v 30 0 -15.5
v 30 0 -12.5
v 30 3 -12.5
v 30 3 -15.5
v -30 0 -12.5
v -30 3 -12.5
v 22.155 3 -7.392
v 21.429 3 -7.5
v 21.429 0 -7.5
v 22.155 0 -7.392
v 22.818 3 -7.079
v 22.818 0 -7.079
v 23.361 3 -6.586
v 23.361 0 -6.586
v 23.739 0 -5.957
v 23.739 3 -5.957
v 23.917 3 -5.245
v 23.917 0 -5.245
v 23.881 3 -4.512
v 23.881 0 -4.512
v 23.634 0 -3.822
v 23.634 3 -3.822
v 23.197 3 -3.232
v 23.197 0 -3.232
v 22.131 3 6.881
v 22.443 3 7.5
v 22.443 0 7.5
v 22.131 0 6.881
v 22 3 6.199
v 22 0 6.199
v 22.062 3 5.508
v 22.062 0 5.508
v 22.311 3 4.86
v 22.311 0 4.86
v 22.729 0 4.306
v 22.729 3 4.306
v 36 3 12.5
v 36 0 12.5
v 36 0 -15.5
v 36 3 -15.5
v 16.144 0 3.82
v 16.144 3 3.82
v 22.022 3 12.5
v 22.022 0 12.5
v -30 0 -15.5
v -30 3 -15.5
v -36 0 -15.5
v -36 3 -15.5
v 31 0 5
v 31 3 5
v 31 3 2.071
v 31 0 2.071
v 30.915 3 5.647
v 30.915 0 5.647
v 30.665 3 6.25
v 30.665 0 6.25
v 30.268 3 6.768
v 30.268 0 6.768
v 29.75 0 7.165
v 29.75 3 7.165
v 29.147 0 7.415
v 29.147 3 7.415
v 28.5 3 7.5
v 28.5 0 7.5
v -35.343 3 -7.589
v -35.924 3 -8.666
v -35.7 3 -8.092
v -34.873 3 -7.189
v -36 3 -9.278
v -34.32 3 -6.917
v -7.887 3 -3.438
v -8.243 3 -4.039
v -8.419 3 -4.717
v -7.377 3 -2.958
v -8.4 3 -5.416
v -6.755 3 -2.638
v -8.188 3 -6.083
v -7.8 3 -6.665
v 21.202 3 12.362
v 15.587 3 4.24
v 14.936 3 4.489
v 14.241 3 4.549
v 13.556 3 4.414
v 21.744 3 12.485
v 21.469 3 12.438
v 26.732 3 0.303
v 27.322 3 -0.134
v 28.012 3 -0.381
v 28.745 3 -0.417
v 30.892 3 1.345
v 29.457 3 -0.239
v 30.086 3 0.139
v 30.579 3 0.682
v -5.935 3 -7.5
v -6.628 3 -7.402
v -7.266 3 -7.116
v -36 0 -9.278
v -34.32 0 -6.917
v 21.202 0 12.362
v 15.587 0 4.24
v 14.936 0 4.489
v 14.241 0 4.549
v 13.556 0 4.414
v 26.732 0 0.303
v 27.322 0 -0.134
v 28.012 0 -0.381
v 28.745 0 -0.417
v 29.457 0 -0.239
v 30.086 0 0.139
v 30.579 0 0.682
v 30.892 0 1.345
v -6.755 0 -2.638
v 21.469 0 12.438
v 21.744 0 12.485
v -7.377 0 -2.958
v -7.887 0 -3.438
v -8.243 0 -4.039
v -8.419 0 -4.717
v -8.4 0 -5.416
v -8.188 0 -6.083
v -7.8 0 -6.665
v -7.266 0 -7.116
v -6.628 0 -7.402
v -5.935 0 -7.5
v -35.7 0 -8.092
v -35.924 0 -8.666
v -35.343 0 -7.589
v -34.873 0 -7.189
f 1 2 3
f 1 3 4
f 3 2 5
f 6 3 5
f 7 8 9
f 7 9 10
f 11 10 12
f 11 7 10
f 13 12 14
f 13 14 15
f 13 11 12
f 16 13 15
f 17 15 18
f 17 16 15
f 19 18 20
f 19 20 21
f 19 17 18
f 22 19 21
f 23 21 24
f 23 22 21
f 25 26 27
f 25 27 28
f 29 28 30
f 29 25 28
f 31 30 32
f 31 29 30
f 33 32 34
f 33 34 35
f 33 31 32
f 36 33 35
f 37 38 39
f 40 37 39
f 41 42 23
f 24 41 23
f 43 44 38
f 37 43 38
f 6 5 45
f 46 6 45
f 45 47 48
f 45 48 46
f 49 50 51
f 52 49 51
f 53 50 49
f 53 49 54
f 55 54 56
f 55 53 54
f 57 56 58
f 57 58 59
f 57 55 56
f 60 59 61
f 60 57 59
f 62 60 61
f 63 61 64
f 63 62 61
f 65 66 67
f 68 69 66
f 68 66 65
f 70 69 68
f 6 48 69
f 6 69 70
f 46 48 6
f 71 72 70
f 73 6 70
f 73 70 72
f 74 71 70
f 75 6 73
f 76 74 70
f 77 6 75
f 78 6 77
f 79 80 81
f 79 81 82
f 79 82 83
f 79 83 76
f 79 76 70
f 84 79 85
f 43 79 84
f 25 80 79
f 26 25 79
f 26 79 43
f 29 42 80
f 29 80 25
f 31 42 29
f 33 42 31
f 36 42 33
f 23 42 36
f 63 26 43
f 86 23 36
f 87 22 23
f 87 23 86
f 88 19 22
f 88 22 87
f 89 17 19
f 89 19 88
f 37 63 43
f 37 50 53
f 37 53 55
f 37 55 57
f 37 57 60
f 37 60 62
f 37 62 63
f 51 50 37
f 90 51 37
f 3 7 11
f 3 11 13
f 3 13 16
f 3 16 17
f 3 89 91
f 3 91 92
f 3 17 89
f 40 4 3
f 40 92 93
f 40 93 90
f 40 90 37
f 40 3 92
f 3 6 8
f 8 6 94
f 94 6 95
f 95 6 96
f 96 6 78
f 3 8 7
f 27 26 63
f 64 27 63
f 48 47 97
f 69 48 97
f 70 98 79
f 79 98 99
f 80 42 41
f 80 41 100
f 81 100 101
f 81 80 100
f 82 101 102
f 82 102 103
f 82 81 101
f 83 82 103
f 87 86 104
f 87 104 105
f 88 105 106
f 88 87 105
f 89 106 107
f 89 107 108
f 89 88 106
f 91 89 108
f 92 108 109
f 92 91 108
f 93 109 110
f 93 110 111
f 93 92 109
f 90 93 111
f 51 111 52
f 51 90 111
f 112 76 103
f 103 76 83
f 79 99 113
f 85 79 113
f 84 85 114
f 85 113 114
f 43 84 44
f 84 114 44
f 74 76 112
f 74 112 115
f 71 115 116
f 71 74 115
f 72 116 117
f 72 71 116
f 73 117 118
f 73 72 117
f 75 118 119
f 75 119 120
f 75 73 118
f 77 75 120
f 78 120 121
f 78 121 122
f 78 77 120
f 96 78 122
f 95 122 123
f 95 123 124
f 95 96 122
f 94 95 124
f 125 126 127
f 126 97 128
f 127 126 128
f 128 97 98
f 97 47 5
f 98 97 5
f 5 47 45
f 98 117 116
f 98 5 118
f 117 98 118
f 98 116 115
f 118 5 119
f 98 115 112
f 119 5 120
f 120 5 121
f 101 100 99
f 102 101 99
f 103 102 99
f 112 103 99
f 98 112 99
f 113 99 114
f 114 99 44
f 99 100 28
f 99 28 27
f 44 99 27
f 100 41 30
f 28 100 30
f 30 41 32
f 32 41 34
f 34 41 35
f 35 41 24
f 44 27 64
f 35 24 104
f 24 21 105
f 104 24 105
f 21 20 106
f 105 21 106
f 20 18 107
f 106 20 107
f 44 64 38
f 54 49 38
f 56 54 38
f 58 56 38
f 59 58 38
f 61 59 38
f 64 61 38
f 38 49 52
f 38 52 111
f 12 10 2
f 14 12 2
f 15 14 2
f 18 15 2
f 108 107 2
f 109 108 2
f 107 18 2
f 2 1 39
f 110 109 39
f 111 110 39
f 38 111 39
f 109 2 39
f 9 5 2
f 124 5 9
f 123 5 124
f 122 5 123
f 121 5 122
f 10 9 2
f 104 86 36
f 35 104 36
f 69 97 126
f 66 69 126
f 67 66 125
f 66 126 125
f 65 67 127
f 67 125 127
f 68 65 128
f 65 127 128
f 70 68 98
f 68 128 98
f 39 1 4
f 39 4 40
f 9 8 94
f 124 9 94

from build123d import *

# Parameters (mm, degrees)
SKETCH1_W           = 6
SKETCH1_H           = 3
BOSS_EXTRUDE1_DEPTH = 3
CUT_EXTRUDE1_REACH  = 41.31
FILLET1_R           = 2.5


with BuildPart() as part:
    # Sketch1 → Boss-Extrude1 (new body)
    with BuildSketch(Plane(origin=(0, 0, 0), x_dir=(1, 0, 0), z_dir=(0, 1, 0))):
        Polygon((-36, 12.5), (-36, 7.5), (21.6, -12.5), (36, -12.5), (36, 12.5), (30, 12.5), (-30, 12.5), align=None)
        with Locations((-33, 14)):
            Rectangle(SKETCH1_W, SKETCH1_H)
        with Locations((33, 14)):
            Rectangle(SKETCH1_W, SKETCH1_H)
    extrude(amount=BOSS_EXTRUDE1_DEPTH)

    # Sketch2 → Cut-Extrude1 (cut, up to next)
    with BuildSketch(Plane(origin=(0, 3, 0), x_dir=(1, 0, 0), z_dir=(0, 1, 0)), mode=Mode.PRIVATE) as cut_extrude1_sk1:
        Polygon((-20.75664079, 7.5), (15.036345763, -4.928120331), (27.464466094, 7.5), align=None)
    cut_extrude1_tool1 = extrude(cut_extrude1_sk1.sketch, amount=-CUT_EXTRUDE1_REACH, mode=Mode.PRIVATE) & part.part
    # Sketch2 → Cut-Extrude1 (cut, up to next)
    with BuildSketch(Plane(origin=(0, 3, 0), x_dir=(1, 0, 0), z_dir=(0, 1, 0)), mode=Mode.PRIVATE) as cut_extrude1_sk2:
        Polygon((31, 3.964466094), (20.284973417, -6.750560489), (22.44335921, -7.5), (31, -7.5), align=None)
    cut_extrude1_tool2 = extrude(cut_extrude1_sk2.sketch, amount=-CUT_EXTRUDE1_REACH, mode=Mode.PRIVATE) & part.part
    add(cut_extrude1_tool1.solids().sort_by_distance((7.248057, 3, -3.357293))[0], mode=Mode.SUBTRACT)
    add(cut_extrude1_tool2.solids().sort_by_distance((27.286818, 3, 3.618293))[0], mode=Mode.SUBTRACT)

    # Fillet1
    # the kernel refuses this fillet: 2.5 mm, written as the material it adds along each edge
    with BuildSketch(Plane(origin=(20.284973417, 3, 6.750560489), x_dir=(0.7071067811865467, 0, -0.7071067811865482), z_dir=(0, -1, 0))) as fillet1_piece_1:
        with BuildLine():
            CenterArc((3.456558168, 2.5), FILLET1_R, 190.226667661, 79.773332339)
            Line((0.99627547, 2.056142991), (0, 0))
            Line((0, 0), (3.456558168, 0))
        make_face()
    extrude(amount=3)
    with BuildSketch(Plane(origin=(31, 3, -3.964466094), x_dir=(0, 0, 1), z_dir=(0, -1, 0)), Plane(origin=(27.464466094, 3, -7.5), x_dir=(-0.7071067811865461, 0, 0.707106781186549), z_dir=(0, -1, 0))) as fillet1_piece_2:
        with BuildLine():
            CenterArc((FILLET1_R * 2.41421356237, FILLET1_R), FILLET1_R, 135, 135)
            Line((FILLET1_R * 1.70710678119, FILLET1_R * 1.70710678119), (0, 0))
            Line((0, 0), (FILLET1_R * 2.41421356237, 0))
        make_face()
    extrude(amount=3)
    with BuildSketch(Plane(origin=(31, 3, 7.5), x_dir=(0, 0, -1), z_dir=(0, -1, 0))) as fillet1_piece_3:
        with BuildLine():
            CenterArc((FILLET1_R, -FILLET1_R), FILLET1_R, 90, 90)
            Line((0, -FILLET1_R), (0, 0))
            Line((0, 0), (FILLET1_R, 0))
        make_face()
    extrude(amount=3)
    with BuildSketch(Plane(origin=(-20.75664079, 3, -7.5), x_dir=(0.9446736642347862, 0, 0.3280116889704124), z_dir=(0, -1, 0))) as fillet1_piece_4:
        with BuildLine():
            CenterArc((FILLET1_R * 5.92867184197, -FILLET1_R), FILLET1_R, 90, 160.851862542)
            Line((FILLET1_R * 5.600660153, -FILLET1_R * 1.94467366423), (0, 0))
            Line((0, 0), (FILLET1_R * 5.92867184197, 0))
        make_face()
    extrude(amount=3)
    with BuildSketch(Plane(origin=(15.036345763, 3, 4.928120331), x_dir=(-0.9446736642347863, 0, -0.3280116889704122), z_dir=(0, -1, 0))) as fillet1_piece_5:
        with BuildLine():
            CenterArc((FILLET1_R * 0.626668316014, FILLET1_R), FILLET1_R, 205.851862542, 64.148137458)
            Line((-FILLET1_R * 0.273256127554, FILLET1_R * 0.563954135591), (0, 0))
            Line((0, 0), (FILLET1_R * 0.626668316014, 0))
        make_face()
    extrude(amount=3)
    # the kernel refuses this fillet: 2.5 mm, written as the material it takes off along each edge
    with BuildSketch(Plane(origin=(21.6, -1.054199012, 12.5), x_dir=(-0.9446736642347879, 0, -0.32801168897040733), z_dir=(0, 1, 0))) as fillet1_2_piece_1:
        with BuildLine():
            CenterArc((FILLET1_R * 0.168671841967, -FILLET1_R), FILLET1_R, 90, 19.148137458)
            Line((-FILLET1_R * 0.159339847004, -FILLET1_R * 0.0553263357652), (0, 0))
            Line((0, 0), (FILLET1_R * 0.168671841967, 0))
        make_face()
    extrude(amount=5.108398025, mode=Mode.SUBTRACT)
    with BuildSketch(Plane(origin=(-36, -4.445902435, -7.5), x_dir=(0, 0, -1), z_dir=(0, 1, 0))) as fillet1_2_piece_2:
        with BuildLine():
            CenterArc((FILLET1_R * 0.711344389572, -FILLET1_R), FILLET1_R, 90, 70.851862542)
            Line((-FILLET1_R * 0.233329274663, -FILLET1_R * 0.67198831103), (0, 0))
            Line((0, 0), (FILLET1_R * 0.711344389572, 0))
        make_face()
    extrude(amount=11.89180487, mode=Mode.SUBTRACT)


solid = part.part
